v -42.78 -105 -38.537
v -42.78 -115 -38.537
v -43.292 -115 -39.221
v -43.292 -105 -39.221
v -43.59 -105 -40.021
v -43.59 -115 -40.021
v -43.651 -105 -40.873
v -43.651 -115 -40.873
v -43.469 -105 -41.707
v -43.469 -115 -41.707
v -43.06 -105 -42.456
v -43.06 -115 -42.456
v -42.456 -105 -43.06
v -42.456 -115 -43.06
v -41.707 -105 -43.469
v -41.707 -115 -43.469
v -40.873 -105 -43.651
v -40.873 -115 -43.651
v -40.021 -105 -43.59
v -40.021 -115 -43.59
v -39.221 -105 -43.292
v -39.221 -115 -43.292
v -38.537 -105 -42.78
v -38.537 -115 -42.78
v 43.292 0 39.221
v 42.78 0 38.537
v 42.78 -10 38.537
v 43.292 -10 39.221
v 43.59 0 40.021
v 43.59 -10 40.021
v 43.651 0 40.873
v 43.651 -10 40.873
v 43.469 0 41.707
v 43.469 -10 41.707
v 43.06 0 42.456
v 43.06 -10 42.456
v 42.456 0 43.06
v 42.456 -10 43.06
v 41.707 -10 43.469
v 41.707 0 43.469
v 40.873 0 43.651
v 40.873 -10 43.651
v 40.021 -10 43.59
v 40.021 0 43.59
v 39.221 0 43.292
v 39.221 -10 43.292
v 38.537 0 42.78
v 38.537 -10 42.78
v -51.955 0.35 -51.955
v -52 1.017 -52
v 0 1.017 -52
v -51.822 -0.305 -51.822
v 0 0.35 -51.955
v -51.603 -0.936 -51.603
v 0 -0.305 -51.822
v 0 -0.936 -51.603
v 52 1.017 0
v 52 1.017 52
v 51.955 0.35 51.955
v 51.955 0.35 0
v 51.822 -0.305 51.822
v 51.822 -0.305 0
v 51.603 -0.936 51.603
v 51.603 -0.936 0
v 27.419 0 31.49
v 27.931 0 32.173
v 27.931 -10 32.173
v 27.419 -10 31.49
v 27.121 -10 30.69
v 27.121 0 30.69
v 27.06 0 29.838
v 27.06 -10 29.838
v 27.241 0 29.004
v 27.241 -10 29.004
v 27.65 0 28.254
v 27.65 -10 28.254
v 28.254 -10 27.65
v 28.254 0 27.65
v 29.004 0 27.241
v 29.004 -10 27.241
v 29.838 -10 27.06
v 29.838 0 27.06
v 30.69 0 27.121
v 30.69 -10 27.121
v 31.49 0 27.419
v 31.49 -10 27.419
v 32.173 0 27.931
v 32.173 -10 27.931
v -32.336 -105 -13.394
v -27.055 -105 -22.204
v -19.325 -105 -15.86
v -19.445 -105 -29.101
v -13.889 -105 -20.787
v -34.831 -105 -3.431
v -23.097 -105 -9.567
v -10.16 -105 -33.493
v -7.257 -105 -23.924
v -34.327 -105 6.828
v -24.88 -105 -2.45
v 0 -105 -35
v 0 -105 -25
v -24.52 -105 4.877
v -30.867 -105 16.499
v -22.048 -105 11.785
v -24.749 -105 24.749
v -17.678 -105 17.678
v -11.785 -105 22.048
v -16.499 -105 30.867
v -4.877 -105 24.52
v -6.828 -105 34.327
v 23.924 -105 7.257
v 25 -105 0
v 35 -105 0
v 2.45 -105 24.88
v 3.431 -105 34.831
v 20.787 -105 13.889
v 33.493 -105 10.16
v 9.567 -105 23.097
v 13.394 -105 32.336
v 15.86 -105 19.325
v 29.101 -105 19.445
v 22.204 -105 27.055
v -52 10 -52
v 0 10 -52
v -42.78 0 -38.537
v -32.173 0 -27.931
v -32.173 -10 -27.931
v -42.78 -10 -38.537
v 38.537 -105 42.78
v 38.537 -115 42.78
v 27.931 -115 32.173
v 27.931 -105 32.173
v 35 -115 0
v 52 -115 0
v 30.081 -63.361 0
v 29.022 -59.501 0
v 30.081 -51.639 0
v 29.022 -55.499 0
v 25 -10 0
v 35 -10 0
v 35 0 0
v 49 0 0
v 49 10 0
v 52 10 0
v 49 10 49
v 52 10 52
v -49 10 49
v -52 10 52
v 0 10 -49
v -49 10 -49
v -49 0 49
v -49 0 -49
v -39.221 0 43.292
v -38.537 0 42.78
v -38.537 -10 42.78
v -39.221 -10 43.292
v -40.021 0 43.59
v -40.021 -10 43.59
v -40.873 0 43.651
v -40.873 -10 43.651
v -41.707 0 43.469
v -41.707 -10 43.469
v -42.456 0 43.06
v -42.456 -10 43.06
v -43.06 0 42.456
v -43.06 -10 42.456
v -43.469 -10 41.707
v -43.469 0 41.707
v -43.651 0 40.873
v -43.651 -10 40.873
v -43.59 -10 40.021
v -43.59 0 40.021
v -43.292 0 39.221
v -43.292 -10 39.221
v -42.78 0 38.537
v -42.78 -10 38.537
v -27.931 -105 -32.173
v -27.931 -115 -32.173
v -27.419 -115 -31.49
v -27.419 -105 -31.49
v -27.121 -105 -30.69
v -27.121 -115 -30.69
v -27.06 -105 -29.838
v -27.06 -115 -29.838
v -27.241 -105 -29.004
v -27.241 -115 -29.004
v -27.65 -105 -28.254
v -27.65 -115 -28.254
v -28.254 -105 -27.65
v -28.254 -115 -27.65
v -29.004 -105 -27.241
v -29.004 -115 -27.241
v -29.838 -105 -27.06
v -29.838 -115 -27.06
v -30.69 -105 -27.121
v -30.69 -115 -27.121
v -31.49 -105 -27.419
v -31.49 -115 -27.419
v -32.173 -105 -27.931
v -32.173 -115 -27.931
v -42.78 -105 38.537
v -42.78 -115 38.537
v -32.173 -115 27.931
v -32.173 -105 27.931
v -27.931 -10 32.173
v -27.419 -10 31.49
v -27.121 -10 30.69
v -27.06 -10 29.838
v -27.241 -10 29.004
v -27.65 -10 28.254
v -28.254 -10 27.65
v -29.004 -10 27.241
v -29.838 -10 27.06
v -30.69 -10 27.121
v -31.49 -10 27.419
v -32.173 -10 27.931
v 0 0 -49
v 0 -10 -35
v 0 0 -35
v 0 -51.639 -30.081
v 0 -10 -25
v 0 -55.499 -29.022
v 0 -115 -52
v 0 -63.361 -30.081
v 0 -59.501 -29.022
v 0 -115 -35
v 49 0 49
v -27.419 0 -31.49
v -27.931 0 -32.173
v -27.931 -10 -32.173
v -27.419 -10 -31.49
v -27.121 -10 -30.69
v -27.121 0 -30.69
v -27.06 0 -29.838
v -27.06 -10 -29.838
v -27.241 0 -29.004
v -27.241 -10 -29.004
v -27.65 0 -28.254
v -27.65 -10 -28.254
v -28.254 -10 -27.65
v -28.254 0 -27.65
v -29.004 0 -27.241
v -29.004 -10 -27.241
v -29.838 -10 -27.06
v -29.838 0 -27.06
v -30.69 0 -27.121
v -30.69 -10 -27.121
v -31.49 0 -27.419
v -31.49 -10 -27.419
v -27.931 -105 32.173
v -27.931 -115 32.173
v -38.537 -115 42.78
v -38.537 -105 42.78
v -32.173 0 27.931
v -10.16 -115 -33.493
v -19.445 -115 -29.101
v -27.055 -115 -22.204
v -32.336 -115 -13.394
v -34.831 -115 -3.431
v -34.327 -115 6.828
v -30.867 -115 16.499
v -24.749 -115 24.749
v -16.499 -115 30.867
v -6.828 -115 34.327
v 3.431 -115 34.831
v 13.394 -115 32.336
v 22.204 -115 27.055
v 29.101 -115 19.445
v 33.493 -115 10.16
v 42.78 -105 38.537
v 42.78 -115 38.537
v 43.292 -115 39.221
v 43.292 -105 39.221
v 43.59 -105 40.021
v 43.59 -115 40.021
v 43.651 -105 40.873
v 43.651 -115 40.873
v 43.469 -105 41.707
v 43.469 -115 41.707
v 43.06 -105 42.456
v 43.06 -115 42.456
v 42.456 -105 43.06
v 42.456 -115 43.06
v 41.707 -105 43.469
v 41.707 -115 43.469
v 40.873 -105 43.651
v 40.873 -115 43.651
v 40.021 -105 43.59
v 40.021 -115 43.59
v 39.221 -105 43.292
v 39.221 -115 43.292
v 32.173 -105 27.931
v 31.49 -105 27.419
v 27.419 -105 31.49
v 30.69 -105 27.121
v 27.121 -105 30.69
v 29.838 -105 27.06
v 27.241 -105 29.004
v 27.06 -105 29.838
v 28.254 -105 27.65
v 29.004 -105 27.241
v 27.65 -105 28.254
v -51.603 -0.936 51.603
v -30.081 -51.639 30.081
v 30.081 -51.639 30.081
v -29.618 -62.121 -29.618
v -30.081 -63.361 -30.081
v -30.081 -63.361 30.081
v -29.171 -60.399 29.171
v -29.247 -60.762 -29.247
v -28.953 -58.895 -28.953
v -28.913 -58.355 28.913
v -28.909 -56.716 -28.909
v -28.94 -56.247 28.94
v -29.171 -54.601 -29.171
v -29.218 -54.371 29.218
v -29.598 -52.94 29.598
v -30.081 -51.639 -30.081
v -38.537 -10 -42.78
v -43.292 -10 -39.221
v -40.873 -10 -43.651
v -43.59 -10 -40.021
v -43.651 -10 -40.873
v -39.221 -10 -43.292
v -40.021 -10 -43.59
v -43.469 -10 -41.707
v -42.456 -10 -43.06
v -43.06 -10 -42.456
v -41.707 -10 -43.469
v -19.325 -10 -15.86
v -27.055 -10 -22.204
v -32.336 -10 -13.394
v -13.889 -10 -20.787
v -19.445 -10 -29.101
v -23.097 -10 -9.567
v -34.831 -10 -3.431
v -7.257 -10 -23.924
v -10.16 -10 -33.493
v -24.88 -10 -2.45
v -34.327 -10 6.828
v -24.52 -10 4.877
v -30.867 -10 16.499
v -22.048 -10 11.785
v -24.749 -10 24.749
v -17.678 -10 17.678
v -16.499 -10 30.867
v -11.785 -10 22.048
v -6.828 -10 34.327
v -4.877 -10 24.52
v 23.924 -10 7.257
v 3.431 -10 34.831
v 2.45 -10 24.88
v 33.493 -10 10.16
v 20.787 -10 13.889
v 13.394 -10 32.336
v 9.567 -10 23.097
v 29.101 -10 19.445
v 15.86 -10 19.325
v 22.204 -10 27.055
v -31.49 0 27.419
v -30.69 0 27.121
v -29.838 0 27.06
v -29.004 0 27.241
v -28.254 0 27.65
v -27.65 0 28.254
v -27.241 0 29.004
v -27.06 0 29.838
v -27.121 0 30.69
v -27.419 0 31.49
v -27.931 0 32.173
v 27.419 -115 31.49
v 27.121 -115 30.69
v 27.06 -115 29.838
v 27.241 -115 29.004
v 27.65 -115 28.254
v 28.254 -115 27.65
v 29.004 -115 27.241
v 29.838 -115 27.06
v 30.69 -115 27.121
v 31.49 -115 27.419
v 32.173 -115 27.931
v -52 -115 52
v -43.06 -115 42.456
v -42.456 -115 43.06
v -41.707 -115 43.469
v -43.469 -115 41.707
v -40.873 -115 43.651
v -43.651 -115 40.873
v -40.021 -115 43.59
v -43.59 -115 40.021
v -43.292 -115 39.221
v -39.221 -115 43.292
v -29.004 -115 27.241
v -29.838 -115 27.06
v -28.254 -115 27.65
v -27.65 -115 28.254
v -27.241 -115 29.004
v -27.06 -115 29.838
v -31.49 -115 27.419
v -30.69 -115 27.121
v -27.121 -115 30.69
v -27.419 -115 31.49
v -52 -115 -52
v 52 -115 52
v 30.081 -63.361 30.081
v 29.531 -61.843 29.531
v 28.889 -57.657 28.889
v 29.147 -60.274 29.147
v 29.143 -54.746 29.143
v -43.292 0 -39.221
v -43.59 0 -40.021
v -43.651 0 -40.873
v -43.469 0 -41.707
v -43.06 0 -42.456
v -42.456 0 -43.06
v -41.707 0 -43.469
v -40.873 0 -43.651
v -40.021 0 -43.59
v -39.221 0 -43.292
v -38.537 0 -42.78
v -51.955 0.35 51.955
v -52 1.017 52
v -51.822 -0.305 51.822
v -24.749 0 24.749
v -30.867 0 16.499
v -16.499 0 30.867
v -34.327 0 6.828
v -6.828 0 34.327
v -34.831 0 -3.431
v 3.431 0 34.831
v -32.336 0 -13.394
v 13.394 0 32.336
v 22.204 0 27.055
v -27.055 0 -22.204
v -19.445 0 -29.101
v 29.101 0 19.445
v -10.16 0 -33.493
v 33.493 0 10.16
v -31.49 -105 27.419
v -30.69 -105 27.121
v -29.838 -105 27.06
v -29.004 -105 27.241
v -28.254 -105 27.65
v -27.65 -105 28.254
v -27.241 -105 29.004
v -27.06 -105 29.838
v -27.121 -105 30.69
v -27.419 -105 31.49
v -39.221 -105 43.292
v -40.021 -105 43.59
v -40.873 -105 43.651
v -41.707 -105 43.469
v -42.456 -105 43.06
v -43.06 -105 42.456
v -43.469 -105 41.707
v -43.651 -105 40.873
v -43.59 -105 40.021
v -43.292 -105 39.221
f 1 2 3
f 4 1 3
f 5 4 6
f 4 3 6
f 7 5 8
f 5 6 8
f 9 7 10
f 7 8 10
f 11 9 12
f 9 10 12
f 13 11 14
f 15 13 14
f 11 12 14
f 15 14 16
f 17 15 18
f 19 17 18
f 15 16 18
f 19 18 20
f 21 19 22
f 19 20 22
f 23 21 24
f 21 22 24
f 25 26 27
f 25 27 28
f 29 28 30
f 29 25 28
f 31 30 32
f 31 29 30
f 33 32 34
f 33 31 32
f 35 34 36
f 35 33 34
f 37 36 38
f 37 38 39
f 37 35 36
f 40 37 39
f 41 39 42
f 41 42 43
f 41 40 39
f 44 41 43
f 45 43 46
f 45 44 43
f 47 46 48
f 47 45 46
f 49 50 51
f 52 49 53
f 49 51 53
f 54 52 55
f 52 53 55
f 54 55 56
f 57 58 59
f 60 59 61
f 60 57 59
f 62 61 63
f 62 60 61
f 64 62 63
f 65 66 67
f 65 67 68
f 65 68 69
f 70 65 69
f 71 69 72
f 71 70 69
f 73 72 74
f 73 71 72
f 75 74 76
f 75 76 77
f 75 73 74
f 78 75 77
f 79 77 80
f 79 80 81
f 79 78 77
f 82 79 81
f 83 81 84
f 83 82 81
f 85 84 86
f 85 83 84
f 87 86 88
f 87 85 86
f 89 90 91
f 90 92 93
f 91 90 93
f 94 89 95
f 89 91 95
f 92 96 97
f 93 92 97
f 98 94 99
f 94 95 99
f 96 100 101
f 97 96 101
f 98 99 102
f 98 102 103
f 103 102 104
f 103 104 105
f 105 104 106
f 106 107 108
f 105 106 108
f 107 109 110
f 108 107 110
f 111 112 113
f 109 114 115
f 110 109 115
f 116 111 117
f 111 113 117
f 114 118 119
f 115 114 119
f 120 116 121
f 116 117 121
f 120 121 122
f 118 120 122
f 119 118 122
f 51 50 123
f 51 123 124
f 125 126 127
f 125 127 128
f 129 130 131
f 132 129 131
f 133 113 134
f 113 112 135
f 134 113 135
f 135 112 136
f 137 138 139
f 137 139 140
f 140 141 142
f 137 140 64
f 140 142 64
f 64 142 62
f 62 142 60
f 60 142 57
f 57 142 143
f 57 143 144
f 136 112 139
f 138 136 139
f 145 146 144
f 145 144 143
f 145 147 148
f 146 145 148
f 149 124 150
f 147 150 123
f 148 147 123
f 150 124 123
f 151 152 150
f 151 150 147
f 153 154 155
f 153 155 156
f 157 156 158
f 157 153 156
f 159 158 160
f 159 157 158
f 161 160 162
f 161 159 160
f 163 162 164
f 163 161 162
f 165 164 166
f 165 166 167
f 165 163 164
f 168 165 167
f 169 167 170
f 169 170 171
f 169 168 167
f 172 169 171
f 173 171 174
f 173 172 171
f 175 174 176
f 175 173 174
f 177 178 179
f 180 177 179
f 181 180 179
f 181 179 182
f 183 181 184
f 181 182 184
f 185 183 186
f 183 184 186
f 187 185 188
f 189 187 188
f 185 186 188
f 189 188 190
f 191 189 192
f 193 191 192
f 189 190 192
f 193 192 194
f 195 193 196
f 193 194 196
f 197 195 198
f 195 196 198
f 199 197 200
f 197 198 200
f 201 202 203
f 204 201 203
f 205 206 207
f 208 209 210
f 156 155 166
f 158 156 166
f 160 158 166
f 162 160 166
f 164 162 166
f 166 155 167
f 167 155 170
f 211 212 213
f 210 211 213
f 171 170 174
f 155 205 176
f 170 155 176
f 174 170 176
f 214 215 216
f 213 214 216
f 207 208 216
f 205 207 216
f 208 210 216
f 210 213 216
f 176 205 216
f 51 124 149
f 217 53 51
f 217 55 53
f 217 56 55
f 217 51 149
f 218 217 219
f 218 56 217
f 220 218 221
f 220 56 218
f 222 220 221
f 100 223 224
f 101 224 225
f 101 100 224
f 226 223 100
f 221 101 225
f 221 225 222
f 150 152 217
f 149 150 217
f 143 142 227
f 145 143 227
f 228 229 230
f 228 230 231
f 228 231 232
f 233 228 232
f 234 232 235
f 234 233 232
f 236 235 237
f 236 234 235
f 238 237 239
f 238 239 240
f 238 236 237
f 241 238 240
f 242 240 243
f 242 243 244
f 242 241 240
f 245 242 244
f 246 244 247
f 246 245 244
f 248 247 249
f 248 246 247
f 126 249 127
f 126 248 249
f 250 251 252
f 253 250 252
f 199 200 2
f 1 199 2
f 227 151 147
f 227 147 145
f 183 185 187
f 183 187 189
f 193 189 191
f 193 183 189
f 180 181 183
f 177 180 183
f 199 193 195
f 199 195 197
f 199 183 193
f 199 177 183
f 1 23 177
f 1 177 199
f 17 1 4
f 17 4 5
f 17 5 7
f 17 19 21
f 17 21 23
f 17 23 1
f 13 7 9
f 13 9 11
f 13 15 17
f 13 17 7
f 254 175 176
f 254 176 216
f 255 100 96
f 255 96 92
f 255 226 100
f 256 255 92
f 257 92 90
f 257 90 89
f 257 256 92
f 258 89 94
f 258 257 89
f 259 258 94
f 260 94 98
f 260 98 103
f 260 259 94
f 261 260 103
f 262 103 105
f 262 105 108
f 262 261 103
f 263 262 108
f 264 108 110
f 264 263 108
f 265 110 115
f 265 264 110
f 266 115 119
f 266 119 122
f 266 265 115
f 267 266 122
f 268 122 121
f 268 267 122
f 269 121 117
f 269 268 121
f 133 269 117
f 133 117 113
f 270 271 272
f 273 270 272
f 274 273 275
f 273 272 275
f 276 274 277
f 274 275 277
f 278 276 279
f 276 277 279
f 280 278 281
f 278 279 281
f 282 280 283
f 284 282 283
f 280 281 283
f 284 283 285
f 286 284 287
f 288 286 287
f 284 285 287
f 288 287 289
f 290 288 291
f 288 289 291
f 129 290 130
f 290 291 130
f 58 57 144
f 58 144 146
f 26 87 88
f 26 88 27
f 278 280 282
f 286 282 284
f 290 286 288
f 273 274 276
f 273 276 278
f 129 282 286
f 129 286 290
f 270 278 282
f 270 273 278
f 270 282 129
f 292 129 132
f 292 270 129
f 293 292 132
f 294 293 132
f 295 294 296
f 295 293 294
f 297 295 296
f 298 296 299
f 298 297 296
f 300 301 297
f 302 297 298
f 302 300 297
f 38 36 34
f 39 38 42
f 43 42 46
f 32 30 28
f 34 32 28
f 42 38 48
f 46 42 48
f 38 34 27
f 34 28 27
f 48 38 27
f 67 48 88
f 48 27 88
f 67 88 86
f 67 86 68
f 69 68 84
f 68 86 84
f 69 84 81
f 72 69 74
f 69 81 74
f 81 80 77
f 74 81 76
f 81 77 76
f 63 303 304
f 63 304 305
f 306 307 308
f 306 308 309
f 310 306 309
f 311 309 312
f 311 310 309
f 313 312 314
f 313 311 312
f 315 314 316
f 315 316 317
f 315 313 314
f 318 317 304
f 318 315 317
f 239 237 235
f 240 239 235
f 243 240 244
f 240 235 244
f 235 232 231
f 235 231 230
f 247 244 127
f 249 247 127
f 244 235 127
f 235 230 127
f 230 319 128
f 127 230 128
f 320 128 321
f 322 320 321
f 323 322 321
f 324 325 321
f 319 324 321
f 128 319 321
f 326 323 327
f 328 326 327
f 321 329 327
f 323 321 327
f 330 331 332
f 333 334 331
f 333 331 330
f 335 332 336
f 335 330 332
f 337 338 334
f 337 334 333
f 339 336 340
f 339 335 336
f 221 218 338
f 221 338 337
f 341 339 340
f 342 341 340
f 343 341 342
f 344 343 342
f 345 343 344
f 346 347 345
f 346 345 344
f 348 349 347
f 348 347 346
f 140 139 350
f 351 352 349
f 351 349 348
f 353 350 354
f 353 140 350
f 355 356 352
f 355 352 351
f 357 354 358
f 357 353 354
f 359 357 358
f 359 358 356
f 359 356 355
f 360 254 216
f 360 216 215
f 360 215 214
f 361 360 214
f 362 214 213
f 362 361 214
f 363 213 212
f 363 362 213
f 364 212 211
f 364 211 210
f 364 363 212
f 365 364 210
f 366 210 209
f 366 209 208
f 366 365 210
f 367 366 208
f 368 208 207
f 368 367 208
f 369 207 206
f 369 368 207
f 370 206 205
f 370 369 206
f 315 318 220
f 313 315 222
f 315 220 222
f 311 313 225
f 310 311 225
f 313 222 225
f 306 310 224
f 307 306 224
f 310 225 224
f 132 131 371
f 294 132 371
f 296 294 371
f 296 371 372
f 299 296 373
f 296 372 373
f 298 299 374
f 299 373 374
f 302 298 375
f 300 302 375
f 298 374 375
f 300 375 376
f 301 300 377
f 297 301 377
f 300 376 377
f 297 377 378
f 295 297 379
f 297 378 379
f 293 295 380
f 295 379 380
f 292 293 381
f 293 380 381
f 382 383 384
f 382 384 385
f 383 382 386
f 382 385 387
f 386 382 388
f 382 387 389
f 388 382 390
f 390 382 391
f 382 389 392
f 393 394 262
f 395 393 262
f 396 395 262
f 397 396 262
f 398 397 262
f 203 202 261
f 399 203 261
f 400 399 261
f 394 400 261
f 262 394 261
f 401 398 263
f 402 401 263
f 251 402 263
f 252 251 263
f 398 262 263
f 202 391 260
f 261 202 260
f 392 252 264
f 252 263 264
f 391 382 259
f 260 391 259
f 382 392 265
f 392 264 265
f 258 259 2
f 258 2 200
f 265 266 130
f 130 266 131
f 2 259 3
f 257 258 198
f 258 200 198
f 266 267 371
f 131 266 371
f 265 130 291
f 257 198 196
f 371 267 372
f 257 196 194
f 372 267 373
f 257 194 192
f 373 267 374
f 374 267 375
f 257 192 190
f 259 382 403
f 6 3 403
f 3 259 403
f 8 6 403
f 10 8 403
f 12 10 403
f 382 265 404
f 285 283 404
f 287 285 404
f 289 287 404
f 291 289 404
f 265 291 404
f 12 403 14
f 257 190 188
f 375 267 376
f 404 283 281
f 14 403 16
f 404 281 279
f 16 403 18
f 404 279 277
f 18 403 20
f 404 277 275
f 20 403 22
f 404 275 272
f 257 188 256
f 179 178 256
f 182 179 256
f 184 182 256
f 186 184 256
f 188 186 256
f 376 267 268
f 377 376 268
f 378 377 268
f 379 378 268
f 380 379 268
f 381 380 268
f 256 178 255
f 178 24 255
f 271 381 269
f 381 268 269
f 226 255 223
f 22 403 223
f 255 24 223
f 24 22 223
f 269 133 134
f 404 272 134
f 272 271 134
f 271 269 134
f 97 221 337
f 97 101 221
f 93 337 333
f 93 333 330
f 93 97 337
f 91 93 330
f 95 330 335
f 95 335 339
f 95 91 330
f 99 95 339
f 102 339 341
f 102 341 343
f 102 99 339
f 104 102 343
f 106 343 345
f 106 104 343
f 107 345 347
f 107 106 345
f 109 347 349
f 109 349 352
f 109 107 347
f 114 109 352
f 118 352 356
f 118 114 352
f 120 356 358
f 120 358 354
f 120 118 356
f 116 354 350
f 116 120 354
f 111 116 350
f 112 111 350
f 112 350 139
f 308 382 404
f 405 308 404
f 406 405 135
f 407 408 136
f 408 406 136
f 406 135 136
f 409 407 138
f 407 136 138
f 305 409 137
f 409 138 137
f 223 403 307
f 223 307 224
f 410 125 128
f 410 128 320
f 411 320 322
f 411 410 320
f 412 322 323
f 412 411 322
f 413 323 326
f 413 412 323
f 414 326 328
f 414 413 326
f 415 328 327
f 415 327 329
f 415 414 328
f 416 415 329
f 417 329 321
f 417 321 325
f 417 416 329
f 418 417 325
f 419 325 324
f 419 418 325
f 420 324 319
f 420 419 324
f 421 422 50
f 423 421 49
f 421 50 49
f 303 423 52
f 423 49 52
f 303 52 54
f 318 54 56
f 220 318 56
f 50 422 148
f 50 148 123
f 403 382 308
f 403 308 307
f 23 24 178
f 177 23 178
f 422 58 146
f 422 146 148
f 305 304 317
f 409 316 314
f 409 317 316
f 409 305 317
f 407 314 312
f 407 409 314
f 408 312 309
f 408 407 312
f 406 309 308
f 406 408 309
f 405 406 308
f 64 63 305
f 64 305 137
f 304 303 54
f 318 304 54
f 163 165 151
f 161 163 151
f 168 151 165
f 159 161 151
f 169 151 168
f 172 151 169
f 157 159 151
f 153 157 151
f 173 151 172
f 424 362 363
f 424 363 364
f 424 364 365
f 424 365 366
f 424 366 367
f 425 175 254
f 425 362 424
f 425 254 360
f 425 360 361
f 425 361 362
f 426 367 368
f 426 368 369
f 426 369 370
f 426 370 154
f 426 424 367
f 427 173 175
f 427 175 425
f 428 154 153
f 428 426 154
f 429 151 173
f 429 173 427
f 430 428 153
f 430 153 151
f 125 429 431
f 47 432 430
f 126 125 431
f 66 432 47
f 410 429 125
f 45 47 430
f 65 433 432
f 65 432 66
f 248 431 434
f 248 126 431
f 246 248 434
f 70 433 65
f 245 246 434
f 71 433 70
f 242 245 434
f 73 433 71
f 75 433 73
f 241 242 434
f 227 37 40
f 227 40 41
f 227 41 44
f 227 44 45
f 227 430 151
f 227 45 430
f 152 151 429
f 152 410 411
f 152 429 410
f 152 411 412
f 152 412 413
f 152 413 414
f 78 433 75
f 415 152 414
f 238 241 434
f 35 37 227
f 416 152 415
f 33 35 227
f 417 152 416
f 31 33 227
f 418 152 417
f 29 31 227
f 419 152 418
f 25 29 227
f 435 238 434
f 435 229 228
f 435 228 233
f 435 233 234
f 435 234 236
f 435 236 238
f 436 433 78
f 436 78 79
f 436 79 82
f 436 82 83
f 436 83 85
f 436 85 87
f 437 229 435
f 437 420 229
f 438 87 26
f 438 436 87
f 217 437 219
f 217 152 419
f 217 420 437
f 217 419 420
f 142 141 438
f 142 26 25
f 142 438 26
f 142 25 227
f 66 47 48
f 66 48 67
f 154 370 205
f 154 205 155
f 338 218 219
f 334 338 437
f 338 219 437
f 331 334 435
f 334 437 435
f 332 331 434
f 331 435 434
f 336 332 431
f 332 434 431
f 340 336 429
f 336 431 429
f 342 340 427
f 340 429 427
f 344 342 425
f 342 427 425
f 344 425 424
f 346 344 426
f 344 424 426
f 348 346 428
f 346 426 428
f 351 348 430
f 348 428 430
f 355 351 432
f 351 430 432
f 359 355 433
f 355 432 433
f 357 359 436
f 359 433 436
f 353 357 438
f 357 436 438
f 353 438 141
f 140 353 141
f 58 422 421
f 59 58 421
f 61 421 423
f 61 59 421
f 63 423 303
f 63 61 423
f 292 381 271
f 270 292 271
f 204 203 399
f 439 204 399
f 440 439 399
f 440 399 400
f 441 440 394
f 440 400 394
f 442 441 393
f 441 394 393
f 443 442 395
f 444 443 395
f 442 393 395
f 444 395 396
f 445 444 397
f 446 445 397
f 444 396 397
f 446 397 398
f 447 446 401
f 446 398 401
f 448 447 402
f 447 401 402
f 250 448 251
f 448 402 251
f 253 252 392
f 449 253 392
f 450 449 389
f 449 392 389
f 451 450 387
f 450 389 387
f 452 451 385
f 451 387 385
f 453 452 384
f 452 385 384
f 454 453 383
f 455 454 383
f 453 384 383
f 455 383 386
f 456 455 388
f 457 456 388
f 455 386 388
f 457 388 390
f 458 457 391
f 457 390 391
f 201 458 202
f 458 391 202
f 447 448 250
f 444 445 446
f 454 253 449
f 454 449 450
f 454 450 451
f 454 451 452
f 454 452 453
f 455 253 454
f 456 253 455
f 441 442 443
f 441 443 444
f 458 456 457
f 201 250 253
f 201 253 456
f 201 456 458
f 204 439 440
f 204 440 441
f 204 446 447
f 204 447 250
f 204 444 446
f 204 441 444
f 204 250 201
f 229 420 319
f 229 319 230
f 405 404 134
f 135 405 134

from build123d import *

# Parameters (mm, degrees)
SKETCH1_W           = 104
SKETCH1_H           = 104
BOSS_EXTRUDE1_DEPTH = 57.5
BOSS_EXTRUDE1_DRAFT = -23
SKETCH1_3_R         = 25
CUT_EXTRUDE1_DEPTH  = 94.350147295
SKETCH3_R           = 35
CUT_EXTRUDE2_DEPTH  = 10
SKETCH4_W           = 95.556530254
SKETCH4_H           = 88.466852203
CUT_EXTRUDE3_DEPTH  = 137.502747225
FILLET1_R           = 15
BOSS_EXTRUDE2_DEPTH = 10
FILLET2_R           = 5
CUT_EXTRUDE4_DEPTH  = 10


# Read off the part's stored shape, not the designer's step: Mirror2
with BuildPart() as part:
    # Sketch1 → Boss-Extrude1 (with draft: the straight prism first)
    with BuildSketch(Plane(origin=(0, 0, 0), x_dir=(1, 0, 0), z_dir=(0, 1, 0))):
        Rectangle(SKETCH1_W, SKETCH1_H)
    extrude(amount=-BOSS_EXTRUDE1_DEPTH)
    # Boss-Extrude1: the draft: its side faces are tilted about the plane it starts from
    boss_extrude1_sides = [part.faces().sort_by_distance(p)[0] for p in [
        (-52, -28.75, 0),
        (0, -28.75, 52),
        (52, -28.75, 0),
        (0, -28.75, -52),
    ]]
    draft(boss_extrude1_sides, Plane(origin=(0, 0, 0), x_dir=(1, 0, 0), z_dir=(0, 1, 0)), BOSS_EXTRUDE1_DRAFT)

    # Sketch1<3> → Cut-Extrude1 (cut, through all)
    with BuildSketch(Plane(origin=(0, 0, 0), x_dir=(1, 0, 0), z_dir=(0, 1, 0))):
        with Locations(Location((0, 0, 0), (0, 0, 270))):
            Circle(SKETCH1_3_R)
    extrude(amount=-CUT_EXTRUDE1_DEPTH, mode=Mode.SUBTRACT)

    # Sketch3 → Cut-Extrude2 (cut)
    with BuildSketch(Plane(origin=(0, 0, 0), x_dir=(1, 0, 0), z_dir=(0, 1, 0))):
        with Locations(Location((0, 0, 0), (0, 0, 270))):
            Circle(SKETCH3_R)
    extrude(amount=-CUT_EXTRUDE2_DEPTH, mode=Mode.SUBTRACT)

    # Mirror2: part across plane


with BuildPart() as part_1:
    add(part.part)
    add(part.part.mirror(Plane.ZX.offset(-57.5)))

    # Sketch4 → Cut-Extrude3 (cut, through all)
    with BuildSketch(Plane(origin=(0, 0, 0), x_dir=(1, 0, 0), z_dir=(0, 1, 0))):
        with Locations((47.778265127, 44.233426102)):
            Rectangle(SKETCH4_W, SKETCH4_H)
    extrude(amount=-CUT_EXTRUDE3_DEPTH, mode=Mode.SUBTRACT)

    # Fillet1
    fillet1_edges = [part_1.edges().sort_by_distance(p)[0] for p in [
        (-13.796349034, -57.5, -27.592698068),
        (-27.592698068, -57.5, 0),
        (0, -57.5, 27.592698068),
        (27.592698068, -57.5, 13.796349034),
    ]]
    fillet(fillet1_edges, radius=FILLET1_R)

    # Sketch5 → Boss-Extrude2 (add)
    with BuildSketch(Plane(origin=(0, 0, 0), x_dir=(1, 0, 0), z_dir=(0, 1, 0))):
        Polygon((-49, 49), (-49, -49), (49, -49), (49, -3), (49, 0), (52, 0), (52, -52), (-52, -52), (-52, 52), (0, 52), (0, 49), (-3, 49), align=None)
    extrude(amount=BOSS_EXTRUDE2_DEPTH)

    # Fillet2
    fillet2_edges = [part_1.edges().sort_by_distance(p)[0] for p in [
        (-52, 0, 0),
        (-26, 0, -52),
        (52, 0, 26),
        (0, 0, 52),
    ]]
    fillet(fillet2_edges, radius=FILLET2_R)

    # Sketch6 → Cut-Extrude4 (cut)
    with BuildSketch(Plane(origin=(0, 0, 0), x_dir=(1, 0, 0), z_dir=(0, 1, 0))):
        with BuildLine():
            Line((-42.779960262, -38.537319575), (-32.173358544, -27.930717857))
            ThreePointArc((-32.173358544, -27.930717857), (-27.930717857, -27.930717857), (-27.930717857, -32.173358544))
            Line((-27.930717857, -32.173358544), (-38.537319575, -42.779960262))
            ThreePointArc((-38.537319575, -42.779960262), (-42.779960262, -42.779960262), (-42.779960262, -38.537319575))
        make_face()
        with BuildLine():
            Line((-38.537319575, 42.779960262), (-27.930717857, 32.173358544))
            ThreePointArc((-27.930717857, 32.173358544), (-27.930717857, 27.930717857), (-32.173358544, 27.930717857))
            Line((-32.173358544, 27.930717857), (-42.779960262, 38.537319575))
            ThreePointArc((-42.779960262, 38.537319575), (-42.779960262, 42.779960262), (-38.537319575, 42.779960262))
        make_face()
        with BuildLine():
            Line((38.537319575, -42.779960262), (27.930717857, -32.173358544))
            ThreePointArc((27.930717857, -32.173358544), (27.930717857, -27.930717857), (32.173358544, -27.930717857))
            Line((32.173358544, -27.930717857), (42.779960262, -38.537319575))
            ThreePointArc((42.779960262, -38.537319575), (42.779960262, -42.779960262), (38.537319575, -42.779960262))
        make_face()
    cut_extrude4 = extrude(amount=-CUT_EXTRUDE4_DEPTH, mode=Mode.SUBTRACT)

    # Mirror3: Cut-Extrude4 across plane
    add(cut_extrude4.mirror(Plane.ZX.offset(-57.5)), mode=Mode.SUBTRACT)


solid = part_1.part
